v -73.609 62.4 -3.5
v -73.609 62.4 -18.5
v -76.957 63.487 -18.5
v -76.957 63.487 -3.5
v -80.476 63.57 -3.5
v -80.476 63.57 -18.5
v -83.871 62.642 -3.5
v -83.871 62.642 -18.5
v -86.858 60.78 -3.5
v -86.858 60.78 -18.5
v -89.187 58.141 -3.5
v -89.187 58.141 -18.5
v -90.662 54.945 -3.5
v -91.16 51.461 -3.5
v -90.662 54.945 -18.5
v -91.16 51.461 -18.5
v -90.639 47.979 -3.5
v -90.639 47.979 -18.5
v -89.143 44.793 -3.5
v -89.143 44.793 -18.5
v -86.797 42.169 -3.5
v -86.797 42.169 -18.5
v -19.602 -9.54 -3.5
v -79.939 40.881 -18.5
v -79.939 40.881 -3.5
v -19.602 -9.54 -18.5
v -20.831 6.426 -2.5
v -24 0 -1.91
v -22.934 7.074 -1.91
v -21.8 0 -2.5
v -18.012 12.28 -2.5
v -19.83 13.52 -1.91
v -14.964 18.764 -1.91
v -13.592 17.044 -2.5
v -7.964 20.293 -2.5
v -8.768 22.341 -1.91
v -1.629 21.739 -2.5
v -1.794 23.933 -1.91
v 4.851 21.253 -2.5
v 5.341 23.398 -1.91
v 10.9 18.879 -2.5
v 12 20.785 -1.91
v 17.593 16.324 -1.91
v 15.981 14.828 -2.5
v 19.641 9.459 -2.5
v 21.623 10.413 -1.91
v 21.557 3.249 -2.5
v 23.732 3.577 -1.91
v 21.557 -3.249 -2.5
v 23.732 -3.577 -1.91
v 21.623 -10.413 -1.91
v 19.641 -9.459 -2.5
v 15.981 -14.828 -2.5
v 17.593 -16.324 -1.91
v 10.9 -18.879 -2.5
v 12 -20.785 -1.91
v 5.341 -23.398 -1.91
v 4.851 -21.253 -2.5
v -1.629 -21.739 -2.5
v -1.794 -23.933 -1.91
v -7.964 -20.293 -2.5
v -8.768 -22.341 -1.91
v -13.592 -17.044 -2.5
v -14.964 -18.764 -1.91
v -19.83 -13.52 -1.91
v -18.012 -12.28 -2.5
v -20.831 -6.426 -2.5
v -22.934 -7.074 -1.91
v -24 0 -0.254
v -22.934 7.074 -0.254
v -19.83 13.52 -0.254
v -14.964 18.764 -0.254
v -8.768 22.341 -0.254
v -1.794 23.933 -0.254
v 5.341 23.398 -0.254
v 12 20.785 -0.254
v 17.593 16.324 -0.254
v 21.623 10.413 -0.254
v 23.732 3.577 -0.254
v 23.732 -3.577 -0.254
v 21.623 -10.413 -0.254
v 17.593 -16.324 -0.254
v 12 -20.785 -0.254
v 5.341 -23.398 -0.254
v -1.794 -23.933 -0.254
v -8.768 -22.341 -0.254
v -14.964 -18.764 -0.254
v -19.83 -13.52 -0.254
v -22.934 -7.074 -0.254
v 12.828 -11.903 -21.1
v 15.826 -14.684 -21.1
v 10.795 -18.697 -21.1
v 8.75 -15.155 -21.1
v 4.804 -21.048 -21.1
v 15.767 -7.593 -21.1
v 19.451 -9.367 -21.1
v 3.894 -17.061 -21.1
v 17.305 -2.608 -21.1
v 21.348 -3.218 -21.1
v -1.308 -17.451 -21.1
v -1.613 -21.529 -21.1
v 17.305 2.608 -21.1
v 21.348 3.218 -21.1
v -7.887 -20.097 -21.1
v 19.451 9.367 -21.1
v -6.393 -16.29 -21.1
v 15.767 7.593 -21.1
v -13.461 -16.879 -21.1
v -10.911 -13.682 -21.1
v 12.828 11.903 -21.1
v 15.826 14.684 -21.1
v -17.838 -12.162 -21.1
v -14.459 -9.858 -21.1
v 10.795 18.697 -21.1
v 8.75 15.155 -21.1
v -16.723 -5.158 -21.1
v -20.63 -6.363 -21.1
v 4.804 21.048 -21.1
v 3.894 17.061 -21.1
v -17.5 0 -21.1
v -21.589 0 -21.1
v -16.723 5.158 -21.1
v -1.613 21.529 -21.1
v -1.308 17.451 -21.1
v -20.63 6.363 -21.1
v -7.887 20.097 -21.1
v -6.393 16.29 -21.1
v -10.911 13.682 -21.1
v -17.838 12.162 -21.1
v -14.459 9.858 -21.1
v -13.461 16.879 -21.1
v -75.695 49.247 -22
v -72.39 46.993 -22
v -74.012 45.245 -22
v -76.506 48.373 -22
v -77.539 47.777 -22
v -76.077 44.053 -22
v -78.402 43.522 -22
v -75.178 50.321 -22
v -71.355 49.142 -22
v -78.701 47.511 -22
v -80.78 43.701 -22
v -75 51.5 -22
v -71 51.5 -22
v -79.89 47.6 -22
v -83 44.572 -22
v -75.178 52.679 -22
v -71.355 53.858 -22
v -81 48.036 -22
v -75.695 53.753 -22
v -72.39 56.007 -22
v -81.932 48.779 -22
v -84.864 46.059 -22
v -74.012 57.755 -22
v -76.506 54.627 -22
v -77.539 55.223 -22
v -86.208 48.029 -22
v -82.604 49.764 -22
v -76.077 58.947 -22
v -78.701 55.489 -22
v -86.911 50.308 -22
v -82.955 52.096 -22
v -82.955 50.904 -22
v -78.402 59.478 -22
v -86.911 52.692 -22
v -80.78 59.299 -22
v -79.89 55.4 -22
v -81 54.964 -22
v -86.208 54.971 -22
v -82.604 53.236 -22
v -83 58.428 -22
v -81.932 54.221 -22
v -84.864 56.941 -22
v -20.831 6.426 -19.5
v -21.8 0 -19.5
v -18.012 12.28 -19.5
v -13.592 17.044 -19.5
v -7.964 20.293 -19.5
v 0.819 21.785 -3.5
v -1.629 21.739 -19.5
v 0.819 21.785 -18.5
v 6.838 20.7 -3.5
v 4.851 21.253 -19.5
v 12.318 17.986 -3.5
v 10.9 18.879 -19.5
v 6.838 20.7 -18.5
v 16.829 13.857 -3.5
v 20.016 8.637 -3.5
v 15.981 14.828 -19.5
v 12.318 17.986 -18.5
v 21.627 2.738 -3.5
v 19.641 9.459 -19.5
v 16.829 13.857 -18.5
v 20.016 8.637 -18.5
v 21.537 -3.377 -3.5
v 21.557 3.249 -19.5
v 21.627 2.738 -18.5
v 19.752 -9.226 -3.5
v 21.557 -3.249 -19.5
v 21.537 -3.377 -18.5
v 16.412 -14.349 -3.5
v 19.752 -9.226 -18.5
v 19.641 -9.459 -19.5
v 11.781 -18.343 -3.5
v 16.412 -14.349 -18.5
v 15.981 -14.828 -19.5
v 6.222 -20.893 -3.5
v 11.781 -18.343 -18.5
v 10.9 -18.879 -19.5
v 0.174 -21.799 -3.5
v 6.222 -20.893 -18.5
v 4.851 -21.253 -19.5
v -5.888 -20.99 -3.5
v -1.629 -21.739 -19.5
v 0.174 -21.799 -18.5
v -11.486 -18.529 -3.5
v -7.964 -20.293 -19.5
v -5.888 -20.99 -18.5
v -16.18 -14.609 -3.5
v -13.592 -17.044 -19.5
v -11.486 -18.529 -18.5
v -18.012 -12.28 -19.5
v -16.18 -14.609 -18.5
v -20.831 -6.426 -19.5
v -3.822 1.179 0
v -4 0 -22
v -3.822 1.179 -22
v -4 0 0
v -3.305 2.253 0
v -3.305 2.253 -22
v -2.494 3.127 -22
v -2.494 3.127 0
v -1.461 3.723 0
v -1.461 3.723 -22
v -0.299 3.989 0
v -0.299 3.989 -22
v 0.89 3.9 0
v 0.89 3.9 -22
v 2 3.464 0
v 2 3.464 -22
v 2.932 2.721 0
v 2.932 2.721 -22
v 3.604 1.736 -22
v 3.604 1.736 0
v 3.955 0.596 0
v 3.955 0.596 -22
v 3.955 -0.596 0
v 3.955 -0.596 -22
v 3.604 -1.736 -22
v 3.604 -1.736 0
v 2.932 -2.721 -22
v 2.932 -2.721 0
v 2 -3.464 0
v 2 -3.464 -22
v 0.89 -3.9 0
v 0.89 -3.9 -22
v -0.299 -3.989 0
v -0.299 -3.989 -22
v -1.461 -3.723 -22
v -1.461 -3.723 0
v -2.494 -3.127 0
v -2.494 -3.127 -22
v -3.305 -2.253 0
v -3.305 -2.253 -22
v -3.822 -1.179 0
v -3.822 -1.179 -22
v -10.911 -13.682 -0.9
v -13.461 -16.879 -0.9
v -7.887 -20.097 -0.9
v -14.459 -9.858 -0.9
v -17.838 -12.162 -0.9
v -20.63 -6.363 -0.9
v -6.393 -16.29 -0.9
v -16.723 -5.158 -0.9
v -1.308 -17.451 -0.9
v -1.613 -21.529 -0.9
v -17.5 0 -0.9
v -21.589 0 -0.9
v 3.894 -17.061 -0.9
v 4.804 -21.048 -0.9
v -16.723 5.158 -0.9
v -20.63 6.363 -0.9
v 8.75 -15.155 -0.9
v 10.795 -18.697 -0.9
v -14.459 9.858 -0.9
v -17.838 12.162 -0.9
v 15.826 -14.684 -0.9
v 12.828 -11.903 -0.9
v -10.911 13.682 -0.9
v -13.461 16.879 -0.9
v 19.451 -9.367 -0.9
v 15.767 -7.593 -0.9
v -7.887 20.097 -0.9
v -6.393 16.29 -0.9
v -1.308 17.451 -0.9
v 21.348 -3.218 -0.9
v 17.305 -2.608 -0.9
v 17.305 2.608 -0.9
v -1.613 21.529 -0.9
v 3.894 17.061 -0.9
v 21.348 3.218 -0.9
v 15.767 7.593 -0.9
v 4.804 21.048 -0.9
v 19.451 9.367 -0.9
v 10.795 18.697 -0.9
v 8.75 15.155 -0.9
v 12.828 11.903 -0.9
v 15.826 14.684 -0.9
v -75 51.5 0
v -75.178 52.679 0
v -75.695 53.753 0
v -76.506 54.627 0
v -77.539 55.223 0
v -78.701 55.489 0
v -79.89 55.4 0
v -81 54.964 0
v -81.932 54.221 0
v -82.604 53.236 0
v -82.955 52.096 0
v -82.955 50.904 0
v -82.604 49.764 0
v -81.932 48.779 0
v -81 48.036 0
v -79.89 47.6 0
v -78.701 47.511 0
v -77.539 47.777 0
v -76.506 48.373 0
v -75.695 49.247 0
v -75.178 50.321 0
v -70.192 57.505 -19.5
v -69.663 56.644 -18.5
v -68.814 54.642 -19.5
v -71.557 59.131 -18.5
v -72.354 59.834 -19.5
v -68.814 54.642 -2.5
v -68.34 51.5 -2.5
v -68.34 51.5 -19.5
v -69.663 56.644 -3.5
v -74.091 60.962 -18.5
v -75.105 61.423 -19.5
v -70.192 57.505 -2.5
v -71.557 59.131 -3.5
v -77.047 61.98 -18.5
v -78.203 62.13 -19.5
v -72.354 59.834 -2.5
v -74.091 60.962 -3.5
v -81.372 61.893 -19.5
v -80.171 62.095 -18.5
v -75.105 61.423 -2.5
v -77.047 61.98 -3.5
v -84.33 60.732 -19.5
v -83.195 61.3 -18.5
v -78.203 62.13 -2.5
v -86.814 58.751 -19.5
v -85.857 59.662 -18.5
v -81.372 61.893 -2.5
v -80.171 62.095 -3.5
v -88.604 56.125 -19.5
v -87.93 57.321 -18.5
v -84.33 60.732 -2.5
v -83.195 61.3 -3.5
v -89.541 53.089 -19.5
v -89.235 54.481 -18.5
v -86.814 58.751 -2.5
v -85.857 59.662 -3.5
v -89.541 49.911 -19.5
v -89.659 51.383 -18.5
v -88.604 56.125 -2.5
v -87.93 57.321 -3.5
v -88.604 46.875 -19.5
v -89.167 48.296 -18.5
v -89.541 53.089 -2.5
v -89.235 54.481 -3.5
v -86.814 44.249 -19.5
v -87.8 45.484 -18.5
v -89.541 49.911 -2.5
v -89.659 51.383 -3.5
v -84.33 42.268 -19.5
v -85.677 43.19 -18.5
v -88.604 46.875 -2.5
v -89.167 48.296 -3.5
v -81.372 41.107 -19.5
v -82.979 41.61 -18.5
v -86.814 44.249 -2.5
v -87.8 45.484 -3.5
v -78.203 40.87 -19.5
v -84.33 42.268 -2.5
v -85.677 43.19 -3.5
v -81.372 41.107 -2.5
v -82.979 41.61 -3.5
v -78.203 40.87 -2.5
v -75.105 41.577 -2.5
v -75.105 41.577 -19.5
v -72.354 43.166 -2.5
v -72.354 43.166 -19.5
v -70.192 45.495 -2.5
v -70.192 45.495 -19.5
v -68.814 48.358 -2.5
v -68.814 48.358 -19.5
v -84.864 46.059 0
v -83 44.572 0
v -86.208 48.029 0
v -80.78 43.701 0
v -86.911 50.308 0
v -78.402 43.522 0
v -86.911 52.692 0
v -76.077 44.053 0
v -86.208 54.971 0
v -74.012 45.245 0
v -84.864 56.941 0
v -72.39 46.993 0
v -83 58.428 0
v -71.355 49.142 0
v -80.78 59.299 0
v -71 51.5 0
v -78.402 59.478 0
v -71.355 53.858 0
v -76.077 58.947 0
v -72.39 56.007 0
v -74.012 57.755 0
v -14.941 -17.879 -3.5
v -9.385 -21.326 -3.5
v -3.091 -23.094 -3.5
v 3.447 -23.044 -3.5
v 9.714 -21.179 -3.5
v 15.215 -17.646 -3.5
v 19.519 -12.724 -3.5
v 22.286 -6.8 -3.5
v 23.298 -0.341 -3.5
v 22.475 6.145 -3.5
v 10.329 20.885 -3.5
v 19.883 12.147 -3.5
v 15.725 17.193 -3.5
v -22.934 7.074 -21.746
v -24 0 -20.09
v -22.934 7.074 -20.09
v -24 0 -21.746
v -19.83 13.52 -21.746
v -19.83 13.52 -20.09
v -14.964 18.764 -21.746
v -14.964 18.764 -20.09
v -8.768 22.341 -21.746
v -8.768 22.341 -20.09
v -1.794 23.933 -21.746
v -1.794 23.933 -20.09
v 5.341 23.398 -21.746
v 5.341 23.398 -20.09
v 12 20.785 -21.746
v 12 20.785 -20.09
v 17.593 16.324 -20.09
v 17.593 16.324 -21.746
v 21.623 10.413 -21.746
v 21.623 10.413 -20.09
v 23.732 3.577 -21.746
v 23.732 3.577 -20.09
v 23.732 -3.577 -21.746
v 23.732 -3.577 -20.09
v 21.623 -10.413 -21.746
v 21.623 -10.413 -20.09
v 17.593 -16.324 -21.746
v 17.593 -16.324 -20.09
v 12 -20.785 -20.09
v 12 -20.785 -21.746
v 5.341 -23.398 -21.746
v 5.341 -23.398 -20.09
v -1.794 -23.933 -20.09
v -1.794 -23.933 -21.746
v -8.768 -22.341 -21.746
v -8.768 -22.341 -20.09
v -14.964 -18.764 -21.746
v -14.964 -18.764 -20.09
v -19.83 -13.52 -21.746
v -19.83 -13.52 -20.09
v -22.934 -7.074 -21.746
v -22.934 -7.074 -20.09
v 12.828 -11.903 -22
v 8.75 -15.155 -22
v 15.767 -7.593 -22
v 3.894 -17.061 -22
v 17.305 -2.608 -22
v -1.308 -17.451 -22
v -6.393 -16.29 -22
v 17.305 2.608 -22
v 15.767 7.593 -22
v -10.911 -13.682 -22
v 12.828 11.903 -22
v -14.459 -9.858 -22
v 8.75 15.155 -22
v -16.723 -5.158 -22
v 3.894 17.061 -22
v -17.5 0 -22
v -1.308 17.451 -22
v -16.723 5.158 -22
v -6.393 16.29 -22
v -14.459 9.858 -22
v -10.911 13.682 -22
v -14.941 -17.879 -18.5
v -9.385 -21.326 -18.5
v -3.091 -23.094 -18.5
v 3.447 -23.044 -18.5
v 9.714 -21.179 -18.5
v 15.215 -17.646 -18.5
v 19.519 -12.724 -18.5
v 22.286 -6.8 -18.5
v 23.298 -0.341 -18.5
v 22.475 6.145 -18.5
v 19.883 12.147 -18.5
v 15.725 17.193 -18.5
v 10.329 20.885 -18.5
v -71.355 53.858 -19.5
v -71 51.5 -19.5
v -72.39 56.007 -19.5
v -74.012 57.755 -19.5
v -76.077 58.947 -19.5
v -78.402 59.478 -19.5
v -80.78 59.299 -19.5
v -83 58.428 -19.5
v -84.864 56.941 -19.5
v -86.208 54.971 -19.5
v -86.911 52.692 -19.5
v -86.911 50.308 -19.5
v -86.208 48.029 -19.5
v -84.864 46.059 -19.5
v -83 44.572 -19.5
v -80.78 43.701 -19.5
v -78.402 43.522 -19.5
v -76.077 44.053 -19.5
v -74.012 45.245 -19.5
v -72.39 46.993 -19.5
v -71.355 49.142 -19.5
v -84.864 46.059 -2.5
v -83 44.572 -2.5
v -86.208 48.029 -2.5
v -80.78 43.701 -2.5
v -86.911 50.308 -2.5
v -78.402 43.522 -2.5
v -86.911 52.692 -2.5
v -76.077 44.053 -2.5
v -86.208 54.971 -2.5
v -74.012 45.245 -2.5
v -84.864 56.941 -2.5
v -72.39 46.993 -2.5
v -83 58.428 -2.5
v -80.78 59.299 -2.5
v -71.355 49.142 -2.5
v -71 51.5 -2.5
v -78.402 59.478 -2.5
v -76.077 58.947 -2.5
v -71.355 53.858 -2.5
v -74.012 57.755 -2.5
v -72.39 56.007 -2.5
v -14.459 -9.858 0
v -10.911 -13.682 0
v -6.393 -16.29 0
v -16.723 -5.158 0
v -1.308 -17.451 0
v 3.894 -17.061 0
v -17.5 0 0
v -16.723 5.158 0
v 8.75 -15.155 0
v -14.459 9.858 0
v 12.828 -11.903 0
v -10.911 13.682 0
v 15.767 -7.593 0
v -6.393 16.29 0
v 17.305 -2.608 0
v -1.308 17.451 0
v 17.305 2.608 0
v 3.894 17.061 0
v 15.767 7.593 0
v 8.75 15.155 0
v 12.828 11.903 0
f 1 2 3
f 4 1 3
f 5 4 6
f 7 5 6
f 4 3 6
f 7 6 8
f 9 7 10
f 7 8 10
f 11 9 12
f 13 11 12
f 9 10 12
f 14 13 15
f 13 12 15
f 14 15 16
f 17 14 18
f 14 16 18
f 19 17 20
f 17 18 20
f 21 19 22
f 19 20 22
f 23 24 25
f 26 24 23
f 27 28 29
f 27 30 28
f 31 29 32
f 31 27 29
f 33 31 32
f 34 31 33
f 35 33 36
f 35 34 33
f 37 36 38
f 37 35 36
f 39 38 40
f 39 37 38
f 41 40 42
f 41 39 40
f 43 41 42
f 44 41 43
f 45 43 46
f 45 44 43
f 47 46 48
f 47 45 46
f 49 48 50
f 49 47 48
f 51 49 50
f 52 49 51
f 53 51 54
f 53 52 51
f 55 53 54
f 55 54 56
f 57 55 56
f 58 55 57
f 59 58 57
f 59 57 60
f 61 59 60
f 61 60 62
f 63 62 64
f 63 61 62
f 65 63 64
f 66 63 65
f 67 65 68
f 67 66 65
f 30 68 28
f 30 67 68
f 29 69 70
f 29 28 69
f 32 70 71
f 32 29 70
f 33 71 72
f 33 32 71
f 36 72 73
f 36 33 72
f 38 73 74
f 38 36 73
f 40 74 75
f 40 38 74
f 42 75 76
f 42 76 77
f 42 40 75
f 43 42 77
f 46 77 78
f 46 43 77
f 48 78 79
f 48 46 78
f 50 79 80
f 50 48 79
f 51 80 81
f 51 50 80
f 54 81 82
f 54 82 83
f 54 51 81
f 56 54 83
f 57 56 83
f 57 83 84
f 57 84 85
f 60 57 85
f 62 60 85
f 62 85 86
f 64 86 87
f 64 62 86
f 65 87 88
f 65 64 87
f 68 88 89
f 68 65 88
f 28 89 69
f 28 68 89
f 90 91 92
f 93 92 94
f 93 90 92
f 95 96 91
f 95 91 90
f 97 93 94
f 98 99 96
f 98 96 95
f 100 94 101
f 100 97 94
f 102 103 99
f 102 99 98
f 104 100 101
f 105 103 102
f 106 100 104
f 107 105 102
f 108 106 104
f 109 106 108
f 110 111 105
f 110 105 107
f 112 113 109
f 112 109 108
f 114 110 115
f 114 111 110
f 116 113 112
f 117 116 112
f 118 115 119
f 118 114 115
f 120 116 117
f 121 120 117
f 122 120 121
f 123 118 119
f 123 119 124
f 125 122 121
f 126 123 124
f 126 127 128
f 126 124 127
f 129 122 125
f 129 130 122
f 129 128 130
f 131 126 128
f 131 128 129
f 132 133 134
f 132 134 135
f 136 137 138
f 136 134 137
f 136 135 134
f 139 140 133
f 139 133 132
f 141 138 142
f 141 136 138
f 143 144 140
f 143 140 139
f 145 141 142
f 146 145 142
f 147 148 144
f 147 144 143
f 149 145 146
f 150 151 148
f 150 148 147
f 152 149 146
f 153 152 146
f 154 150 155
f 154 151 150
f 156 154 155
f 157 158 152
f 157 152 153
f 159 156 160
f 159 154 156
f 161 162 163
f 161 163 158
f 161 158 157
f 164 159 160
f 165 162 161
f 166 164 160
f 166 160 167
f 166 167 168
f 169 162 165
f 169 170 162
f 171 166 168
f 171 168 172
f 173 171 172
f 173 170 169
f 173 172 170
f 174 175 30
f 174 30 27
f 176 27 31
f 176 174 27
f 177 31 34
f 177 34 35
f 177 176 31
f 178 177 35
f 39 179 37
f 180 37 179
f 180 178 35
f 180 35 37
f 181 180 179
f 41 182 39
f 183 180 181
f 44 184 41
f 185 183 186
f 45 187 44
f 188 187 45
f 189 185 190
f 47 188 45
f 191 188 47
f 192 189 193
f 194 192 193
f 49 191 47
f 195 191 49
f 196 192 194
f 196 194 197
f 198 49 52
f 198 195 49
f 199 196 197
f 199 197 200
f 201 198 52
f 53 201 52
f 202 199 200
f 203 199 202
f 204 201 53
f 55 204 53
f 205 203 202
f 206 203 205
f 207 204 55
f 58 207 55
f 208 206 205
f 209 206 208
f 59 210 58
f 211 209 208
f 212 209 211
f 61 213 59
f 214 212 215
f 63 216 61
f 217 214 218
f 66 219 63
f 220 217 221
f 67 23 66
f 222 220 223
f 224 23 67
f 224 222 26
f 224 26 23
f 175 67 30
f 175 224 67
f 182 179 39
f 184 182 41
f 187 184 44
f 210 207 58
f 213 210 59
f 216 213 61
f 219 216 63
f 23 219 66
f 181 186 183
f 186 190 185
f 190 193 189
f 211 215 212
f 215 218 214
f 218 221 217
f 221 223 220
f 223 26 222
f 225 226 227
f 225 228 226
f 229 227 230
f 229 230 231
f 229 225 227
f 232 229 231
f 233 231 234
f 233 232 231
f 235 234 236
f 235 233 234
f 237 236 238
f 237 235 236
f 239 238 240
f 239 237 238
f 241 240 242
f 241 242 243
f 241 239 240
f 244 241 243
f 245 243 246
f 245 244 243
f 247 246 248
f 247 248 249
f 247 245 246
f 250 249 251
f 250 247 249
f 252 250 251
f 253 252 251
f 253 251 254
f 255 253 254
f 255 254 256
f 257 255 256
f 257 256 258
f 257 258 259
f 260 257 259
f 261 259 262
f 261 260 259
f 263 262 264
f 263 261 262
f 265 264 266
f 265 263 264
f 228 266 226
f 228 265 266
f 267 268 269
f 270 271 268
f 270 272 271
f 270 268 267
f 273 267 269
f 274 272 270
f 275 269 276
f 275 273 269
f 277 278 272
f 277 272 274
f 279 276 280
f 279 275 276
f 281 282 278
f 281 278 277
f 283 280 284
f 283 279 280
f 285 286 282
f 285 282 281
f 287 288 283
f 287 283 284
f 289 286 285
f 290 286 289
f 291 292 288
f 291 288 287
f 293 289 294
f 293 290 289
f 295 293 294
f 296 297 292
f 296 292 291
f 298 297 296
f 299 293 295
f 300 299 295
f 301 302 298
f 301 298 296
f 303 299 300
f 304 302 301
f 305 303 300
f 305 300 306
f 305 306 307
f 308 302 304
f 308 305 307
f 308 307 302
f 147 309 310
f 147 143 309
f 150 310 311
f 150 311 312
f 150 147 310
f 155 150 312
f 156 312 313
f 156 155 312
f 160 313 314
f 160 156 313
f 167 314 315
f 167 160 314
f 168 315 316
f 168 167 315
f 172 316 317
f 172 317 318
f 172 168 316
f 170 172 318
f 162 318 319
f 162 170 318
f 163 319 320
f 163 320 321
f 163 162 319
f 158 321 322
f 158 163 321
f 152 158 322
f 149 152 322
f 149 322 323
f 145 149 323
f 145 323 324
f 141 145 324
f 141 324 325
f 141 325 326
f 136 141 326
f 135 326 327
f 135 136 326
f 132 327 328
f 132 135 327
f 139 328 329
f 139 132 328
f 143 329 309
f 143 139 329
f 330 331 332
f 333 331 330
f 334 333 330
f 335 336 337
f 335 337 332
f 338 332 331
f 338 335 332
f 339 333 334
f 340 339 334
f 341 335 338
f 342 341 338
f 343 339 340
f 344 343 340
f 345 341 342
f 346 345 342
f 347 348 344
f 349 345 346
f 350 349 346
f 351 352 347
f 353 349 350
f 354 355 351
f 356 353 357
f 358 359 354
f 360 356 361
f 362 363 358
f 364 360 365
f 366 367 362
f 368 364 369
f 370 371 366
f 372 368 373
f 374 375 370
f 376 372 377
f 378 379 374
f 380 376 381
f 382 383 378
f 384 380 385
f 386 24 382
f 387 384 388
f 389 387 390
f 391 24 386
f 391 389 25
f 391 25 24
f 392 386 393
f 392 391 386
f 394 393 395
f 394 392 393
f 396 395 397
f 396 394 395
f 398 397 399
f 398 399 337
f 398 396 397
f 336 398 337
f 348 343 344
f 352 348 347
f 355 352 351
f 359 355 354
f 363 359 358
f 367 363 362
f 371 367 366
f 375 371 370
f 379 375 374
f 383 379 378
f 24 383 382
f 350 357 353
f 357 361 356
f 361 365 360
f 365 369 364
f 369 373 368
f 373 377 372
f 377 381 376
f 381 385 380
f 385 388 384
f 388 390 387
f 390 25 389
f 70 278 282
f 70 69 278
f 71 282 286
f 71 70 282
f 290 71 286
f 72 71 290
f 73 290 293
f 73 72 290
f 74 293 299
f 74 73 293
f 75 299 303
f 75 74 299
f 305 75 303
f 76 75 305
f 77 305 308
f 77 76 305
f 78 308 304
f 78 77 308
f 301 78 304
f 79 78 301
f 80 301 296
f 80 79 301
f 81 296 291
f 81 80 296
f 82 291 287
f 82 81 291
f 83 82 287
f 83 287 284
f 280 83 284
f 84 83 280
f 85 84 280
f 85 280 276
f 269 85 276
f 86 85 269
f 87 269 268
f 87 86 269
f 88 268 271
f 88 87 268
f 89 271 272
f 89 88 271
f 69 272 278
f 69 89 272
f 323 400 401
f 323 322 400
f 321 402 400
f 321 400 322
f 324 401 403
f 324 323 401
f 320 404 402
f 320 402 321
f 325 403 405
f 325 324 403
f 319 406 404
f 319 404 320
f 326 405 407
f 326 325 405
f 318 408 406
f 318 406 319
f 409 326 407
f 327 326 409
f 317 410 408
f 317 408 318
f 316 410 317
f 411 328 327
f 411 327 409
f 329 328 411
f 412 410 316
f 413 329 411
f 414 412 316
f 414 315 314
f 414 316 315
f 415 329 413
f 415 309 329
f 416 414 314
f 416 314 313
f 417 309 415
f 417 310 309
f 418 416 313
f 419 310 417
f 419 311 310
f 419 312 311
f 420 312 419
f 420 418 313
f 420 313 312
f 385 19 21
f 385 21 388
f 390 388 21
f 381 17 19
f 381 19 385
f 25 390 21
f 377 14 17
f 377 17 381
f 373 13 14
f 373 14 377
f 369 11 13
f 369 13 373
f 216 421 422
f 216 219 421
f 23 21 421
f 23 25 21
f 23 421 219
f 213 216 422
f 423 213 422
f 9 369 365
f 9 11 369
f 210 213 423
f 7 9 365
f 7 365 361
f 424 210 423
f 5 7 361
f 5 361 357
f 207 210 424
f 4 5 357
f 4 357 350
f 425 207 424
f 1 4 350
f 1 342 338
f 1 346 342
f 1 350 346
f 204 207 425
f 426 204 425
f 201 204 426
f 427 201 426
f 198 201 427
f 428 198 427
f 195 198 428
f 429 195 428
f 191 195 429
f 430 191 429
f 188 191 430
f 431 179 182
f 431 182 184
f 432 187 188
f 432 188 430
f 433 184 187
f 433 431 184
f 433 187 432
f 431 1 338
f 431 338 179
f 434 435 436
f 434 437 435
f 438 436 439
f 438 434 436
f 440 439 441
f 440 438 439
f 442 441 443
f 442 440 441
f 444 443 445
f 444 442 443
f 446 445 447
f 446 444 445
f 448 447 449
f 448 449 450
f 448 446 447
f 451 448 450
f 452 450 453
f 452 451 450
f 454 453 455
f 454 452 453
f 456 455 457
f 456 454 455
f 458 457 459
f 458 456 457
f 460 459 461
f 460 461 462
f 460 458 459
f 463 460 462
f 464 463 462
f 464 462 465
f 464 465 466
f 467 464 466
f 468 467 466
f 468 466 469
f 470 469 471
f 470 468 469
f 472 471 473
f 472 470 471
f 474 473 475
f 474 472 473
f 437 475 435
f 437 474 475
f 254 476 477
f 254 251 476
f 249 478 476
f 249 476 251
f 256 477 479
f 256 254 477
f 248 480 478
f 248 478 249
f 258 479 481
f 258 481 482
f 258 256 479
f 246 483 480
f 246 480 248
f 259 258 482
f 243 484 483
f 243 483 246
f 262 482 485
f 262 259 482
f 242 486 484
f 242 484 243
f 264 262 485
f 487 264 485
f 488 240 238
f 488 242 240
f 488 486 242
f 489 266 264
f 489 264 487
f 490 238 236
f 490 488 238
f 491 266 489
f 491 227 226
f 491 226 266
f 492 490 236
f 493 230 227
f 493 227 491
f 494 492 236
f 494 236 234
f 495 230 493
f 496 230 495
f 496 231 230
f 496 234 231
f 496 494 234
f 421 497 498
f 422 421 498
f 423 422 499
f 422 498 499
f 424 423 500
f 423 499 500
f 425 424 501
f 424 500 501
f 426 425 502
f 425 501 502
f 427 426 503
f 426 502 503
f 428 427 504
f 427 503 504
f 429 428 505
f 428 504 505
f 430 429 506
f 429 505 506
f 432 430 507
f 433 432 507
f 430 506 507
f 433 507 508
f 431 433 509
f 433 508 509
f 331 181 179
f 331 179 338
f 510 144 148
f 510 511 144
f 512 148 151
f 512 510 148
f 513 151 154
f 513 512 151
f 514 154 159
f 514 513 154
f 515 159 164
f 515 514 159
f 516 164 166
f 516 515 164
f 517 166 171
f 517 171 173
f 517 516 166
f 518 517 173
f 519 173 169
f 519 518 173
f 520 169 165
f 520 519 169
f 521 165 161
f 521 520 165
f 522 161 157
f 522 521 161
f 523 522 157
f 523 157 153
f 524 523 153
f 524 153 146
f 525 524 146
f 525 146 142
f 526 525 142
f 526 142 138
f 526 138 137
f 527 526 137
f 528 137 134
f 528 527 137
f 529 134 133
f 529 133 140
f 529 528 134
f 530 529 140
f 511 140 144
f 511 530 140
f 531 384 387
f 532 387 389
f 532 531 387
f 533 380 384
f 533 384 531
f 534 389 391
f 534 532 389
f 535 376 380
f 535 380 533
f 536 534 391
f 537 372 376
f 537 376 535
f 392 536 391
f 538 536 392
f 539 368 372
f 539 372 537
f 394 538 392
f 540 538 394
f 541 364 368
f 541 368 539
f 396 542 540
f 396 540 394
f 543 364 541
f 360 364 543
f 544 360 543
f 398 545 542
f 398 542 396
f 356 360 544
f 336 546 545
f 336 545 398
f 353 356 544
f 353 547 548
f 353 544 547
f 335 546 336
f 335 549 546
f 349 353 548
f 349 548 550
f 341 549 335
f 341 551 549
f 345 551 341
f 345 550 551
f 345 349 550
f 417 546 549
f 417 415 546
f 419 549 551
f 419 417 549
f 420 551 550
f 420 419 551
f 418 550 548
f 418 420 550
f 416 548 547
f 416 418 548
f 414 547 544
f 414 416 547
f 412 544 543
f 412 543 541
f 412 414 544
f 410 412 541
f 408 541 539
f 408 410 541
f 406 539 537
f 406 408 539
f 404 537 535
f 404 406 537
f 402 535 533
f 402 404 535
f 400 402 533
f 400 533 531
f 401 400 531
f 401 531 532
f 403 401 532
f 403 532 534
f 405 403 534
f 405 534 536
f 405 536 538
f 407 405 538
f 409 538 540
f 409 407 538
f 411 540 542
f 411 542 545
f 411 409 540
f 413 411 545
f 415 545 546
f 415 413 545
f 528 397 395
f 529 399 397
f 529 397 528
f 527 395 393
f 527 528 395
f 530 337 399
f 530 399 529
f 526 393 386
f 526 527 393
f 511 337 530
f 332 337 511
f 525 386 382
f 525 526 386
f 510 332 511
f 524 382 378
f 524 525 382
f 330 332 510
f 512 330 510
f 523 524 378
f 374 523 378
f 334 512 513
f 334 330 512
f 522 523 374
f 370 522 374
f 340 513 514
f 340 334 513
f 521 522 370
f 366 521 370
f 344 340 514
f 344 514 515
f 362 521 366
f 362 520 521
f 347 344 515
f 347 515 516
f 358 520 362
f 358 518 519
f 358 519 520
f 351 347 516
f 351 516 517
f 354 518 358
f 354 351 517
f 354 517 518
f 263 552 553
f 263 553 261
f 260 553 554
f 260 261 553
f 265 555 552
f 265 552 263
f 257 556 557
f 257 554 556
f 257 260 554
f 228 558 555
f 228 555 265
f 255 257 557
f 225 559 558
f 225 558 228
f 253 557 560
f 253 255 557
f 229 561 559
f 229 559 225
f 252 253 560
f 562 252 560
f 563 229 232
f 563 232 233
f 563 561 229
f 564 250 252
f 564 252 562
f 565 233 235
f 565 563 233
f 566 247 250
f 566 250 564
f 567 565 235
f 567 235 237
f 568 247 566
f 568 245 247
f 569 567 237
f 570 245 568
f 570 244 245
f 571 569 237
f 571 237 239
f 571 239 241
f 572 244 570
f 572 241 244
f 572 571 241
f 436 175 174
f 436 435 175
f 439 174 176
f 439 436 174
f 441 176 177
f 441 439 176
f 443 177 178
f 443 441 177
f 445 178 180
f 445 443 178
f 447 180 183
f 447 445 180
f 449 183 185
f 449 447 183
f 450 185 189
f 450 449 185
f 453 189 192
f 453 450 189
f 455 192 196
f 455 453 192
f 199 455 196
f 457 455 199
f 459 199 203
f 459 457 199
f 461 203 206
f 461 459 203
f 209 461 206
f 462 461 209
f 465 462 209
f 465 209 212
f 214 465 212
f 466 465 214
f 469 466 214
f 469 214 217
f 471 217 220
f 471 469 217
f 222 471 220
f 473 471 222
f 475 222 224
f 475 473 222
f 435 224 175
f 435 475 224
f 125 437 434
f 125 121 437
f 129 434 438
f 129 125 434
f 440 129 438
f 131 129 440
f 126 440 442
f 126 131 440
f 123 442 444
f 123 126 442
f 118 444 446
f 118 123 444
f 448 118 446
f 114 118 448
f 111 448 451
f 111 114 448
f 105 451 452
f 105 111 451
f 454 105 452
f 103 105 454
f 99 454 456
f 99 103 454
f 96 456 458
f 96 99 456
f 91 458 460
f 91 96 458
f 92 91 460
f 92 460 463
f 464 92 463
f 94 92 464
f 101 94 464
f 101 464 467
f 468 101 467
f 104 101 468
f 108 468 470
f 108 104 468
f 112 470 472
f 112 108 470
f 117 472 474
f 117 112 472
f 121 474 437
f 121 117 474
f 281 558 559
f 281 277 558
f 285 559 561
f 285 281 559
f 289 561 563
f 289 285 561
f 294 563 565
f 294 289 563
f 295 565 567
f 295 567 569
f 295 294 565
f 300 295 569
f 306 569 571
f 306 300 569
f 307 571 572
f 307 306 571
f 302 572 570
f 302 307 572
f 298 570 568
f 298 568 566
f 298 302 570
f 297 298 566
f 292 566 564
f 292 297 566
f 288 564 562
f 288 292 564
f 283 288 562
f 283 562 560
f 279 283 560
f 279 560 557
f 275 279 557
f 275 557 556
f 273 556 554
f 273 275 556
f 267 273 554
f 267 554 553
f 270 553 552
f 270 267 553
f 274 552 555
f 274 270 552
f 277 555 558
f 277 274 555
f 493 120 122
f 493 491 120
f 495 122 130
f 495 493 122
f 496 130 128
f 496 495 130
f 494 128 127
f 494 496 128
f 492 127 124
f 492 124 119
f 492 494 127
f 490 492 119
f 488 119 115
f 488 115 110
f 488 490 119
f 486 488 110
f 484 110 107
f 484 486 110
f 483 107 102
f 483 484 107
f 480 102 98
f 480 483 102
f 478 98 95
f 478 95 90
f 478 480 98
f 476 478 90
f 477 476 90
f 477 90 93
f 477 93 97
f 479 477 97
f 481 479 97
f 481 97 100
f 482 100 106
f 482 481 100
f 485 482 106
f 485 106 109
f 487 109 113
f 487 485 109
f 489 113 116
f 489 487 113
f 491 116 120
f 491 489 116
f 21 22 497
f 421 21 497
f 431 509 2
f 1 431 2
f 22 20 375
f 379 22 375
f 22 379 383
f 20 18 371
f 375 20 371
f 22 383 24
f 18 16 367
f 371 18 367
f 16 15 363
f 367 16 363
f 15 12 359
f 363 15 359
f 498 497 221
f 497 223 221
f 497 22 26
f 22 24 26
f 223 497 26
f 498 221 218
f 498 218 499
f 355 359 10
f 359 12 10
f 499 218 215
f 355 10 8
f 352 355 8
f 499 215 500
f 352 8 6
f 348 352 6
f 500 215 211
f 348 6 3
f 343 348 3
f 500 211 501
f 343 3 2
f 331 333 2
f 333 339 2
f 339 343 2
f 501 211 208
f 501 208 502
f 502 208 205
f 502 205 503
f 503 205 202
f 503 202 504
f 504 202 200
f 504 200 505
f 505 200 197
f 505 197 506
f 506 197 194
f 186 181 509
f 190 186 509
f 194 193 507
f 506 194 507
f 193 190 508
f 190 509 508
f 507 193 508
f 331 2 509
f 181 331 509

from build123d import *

# Parameters (mm, degrees)
EXTRUDE_1_DEPTH      = 7.5
EXTRUDE_1_DEPTH_BACK = 7.5


with BuildPart() as part:
    # 草图1 → 旋转1 (revolve)
    with BuildSketch(Plane(origin=(0, 0, 0), x_dir=(1, 0, 0), z_dir=(0, 1, 0))):
        Polygon((4, 0), (17.5, 0), (17.5, 0.9), (21.589095178, 0.9), (24, 0.254), (24, 1.910441889), (21.8, 2.499930112), (21.8, 19.500069888), (24, 20.089558111), (24, 21.746), (21.589095178, 21.1), (17.5, 21.1), (17.5, 22), (4, 22), align=None)
    revolve(axis=Axis((0, 0, 50), (0, 0, -1)))

    # 草图2 → 凸台-拉伸1 (add, two sides: drawn at the far end of the back side and taken through both)
    with BuildSketch(Plane.XY.offset(-11).offset(-EXTRUDE_1_DEPTH_BACK)):
        with BuildLine():
            Line((-86.797485344, 42.169146754), (-14.940905306, -17.87901979))
            ThreePointArc((-14.940905306, -17.87901979), (19.518784167, -12.724270691), (10.32945325, 20.885219548))
            Line((10.32945325, 20.885219548), (-73.609178047, 62.399754064))
            ThreePointArc((-73.609178047, 62.399754064), (-89.186627274, 58.140649425), (-86.797485344, 42.169146754))
        make_face()
        with BuildLine():
            Line((-84.610854997, 44.78577583), (-12.754274959, -15.262390713))
            ThreePointArc((-12.754274959, -15.262390713), (16.662172407, -10.862049101), (8.817717817, 17.828627331))
            Line((8.817717817, 17.828627331), (-75.120913479, 59.343161847))
            ThreePointArc((-75.120913479, 59.343161847), (-86.330015513, 56.278427835), (-84.610854997, 44.78577583))
        make_face(mode=Mode.SUBTRACT)
    extrude(amount=EXTRUDE_1_DEPTH + EXTRUDE_1_DEPTH_BACK)

    # 草图3 → 旋转2 (revolve)
    with BuildSketch(Plane(origin=(0, 51.5, 0), x_dir=(1, 0, 0), z_dir=(0, 1, 0))):
        Polygon((-89.66, 2.5), (-87, 2.5), (-87, 0), (-83, 0), (-83, 22), (-87, 22), (-87, 19.5), (-89.66, 19.5), align=None)
    revolve(axis=Axis((-79, 51.5, -50), (0, 0, 1)))


solid = part.part
